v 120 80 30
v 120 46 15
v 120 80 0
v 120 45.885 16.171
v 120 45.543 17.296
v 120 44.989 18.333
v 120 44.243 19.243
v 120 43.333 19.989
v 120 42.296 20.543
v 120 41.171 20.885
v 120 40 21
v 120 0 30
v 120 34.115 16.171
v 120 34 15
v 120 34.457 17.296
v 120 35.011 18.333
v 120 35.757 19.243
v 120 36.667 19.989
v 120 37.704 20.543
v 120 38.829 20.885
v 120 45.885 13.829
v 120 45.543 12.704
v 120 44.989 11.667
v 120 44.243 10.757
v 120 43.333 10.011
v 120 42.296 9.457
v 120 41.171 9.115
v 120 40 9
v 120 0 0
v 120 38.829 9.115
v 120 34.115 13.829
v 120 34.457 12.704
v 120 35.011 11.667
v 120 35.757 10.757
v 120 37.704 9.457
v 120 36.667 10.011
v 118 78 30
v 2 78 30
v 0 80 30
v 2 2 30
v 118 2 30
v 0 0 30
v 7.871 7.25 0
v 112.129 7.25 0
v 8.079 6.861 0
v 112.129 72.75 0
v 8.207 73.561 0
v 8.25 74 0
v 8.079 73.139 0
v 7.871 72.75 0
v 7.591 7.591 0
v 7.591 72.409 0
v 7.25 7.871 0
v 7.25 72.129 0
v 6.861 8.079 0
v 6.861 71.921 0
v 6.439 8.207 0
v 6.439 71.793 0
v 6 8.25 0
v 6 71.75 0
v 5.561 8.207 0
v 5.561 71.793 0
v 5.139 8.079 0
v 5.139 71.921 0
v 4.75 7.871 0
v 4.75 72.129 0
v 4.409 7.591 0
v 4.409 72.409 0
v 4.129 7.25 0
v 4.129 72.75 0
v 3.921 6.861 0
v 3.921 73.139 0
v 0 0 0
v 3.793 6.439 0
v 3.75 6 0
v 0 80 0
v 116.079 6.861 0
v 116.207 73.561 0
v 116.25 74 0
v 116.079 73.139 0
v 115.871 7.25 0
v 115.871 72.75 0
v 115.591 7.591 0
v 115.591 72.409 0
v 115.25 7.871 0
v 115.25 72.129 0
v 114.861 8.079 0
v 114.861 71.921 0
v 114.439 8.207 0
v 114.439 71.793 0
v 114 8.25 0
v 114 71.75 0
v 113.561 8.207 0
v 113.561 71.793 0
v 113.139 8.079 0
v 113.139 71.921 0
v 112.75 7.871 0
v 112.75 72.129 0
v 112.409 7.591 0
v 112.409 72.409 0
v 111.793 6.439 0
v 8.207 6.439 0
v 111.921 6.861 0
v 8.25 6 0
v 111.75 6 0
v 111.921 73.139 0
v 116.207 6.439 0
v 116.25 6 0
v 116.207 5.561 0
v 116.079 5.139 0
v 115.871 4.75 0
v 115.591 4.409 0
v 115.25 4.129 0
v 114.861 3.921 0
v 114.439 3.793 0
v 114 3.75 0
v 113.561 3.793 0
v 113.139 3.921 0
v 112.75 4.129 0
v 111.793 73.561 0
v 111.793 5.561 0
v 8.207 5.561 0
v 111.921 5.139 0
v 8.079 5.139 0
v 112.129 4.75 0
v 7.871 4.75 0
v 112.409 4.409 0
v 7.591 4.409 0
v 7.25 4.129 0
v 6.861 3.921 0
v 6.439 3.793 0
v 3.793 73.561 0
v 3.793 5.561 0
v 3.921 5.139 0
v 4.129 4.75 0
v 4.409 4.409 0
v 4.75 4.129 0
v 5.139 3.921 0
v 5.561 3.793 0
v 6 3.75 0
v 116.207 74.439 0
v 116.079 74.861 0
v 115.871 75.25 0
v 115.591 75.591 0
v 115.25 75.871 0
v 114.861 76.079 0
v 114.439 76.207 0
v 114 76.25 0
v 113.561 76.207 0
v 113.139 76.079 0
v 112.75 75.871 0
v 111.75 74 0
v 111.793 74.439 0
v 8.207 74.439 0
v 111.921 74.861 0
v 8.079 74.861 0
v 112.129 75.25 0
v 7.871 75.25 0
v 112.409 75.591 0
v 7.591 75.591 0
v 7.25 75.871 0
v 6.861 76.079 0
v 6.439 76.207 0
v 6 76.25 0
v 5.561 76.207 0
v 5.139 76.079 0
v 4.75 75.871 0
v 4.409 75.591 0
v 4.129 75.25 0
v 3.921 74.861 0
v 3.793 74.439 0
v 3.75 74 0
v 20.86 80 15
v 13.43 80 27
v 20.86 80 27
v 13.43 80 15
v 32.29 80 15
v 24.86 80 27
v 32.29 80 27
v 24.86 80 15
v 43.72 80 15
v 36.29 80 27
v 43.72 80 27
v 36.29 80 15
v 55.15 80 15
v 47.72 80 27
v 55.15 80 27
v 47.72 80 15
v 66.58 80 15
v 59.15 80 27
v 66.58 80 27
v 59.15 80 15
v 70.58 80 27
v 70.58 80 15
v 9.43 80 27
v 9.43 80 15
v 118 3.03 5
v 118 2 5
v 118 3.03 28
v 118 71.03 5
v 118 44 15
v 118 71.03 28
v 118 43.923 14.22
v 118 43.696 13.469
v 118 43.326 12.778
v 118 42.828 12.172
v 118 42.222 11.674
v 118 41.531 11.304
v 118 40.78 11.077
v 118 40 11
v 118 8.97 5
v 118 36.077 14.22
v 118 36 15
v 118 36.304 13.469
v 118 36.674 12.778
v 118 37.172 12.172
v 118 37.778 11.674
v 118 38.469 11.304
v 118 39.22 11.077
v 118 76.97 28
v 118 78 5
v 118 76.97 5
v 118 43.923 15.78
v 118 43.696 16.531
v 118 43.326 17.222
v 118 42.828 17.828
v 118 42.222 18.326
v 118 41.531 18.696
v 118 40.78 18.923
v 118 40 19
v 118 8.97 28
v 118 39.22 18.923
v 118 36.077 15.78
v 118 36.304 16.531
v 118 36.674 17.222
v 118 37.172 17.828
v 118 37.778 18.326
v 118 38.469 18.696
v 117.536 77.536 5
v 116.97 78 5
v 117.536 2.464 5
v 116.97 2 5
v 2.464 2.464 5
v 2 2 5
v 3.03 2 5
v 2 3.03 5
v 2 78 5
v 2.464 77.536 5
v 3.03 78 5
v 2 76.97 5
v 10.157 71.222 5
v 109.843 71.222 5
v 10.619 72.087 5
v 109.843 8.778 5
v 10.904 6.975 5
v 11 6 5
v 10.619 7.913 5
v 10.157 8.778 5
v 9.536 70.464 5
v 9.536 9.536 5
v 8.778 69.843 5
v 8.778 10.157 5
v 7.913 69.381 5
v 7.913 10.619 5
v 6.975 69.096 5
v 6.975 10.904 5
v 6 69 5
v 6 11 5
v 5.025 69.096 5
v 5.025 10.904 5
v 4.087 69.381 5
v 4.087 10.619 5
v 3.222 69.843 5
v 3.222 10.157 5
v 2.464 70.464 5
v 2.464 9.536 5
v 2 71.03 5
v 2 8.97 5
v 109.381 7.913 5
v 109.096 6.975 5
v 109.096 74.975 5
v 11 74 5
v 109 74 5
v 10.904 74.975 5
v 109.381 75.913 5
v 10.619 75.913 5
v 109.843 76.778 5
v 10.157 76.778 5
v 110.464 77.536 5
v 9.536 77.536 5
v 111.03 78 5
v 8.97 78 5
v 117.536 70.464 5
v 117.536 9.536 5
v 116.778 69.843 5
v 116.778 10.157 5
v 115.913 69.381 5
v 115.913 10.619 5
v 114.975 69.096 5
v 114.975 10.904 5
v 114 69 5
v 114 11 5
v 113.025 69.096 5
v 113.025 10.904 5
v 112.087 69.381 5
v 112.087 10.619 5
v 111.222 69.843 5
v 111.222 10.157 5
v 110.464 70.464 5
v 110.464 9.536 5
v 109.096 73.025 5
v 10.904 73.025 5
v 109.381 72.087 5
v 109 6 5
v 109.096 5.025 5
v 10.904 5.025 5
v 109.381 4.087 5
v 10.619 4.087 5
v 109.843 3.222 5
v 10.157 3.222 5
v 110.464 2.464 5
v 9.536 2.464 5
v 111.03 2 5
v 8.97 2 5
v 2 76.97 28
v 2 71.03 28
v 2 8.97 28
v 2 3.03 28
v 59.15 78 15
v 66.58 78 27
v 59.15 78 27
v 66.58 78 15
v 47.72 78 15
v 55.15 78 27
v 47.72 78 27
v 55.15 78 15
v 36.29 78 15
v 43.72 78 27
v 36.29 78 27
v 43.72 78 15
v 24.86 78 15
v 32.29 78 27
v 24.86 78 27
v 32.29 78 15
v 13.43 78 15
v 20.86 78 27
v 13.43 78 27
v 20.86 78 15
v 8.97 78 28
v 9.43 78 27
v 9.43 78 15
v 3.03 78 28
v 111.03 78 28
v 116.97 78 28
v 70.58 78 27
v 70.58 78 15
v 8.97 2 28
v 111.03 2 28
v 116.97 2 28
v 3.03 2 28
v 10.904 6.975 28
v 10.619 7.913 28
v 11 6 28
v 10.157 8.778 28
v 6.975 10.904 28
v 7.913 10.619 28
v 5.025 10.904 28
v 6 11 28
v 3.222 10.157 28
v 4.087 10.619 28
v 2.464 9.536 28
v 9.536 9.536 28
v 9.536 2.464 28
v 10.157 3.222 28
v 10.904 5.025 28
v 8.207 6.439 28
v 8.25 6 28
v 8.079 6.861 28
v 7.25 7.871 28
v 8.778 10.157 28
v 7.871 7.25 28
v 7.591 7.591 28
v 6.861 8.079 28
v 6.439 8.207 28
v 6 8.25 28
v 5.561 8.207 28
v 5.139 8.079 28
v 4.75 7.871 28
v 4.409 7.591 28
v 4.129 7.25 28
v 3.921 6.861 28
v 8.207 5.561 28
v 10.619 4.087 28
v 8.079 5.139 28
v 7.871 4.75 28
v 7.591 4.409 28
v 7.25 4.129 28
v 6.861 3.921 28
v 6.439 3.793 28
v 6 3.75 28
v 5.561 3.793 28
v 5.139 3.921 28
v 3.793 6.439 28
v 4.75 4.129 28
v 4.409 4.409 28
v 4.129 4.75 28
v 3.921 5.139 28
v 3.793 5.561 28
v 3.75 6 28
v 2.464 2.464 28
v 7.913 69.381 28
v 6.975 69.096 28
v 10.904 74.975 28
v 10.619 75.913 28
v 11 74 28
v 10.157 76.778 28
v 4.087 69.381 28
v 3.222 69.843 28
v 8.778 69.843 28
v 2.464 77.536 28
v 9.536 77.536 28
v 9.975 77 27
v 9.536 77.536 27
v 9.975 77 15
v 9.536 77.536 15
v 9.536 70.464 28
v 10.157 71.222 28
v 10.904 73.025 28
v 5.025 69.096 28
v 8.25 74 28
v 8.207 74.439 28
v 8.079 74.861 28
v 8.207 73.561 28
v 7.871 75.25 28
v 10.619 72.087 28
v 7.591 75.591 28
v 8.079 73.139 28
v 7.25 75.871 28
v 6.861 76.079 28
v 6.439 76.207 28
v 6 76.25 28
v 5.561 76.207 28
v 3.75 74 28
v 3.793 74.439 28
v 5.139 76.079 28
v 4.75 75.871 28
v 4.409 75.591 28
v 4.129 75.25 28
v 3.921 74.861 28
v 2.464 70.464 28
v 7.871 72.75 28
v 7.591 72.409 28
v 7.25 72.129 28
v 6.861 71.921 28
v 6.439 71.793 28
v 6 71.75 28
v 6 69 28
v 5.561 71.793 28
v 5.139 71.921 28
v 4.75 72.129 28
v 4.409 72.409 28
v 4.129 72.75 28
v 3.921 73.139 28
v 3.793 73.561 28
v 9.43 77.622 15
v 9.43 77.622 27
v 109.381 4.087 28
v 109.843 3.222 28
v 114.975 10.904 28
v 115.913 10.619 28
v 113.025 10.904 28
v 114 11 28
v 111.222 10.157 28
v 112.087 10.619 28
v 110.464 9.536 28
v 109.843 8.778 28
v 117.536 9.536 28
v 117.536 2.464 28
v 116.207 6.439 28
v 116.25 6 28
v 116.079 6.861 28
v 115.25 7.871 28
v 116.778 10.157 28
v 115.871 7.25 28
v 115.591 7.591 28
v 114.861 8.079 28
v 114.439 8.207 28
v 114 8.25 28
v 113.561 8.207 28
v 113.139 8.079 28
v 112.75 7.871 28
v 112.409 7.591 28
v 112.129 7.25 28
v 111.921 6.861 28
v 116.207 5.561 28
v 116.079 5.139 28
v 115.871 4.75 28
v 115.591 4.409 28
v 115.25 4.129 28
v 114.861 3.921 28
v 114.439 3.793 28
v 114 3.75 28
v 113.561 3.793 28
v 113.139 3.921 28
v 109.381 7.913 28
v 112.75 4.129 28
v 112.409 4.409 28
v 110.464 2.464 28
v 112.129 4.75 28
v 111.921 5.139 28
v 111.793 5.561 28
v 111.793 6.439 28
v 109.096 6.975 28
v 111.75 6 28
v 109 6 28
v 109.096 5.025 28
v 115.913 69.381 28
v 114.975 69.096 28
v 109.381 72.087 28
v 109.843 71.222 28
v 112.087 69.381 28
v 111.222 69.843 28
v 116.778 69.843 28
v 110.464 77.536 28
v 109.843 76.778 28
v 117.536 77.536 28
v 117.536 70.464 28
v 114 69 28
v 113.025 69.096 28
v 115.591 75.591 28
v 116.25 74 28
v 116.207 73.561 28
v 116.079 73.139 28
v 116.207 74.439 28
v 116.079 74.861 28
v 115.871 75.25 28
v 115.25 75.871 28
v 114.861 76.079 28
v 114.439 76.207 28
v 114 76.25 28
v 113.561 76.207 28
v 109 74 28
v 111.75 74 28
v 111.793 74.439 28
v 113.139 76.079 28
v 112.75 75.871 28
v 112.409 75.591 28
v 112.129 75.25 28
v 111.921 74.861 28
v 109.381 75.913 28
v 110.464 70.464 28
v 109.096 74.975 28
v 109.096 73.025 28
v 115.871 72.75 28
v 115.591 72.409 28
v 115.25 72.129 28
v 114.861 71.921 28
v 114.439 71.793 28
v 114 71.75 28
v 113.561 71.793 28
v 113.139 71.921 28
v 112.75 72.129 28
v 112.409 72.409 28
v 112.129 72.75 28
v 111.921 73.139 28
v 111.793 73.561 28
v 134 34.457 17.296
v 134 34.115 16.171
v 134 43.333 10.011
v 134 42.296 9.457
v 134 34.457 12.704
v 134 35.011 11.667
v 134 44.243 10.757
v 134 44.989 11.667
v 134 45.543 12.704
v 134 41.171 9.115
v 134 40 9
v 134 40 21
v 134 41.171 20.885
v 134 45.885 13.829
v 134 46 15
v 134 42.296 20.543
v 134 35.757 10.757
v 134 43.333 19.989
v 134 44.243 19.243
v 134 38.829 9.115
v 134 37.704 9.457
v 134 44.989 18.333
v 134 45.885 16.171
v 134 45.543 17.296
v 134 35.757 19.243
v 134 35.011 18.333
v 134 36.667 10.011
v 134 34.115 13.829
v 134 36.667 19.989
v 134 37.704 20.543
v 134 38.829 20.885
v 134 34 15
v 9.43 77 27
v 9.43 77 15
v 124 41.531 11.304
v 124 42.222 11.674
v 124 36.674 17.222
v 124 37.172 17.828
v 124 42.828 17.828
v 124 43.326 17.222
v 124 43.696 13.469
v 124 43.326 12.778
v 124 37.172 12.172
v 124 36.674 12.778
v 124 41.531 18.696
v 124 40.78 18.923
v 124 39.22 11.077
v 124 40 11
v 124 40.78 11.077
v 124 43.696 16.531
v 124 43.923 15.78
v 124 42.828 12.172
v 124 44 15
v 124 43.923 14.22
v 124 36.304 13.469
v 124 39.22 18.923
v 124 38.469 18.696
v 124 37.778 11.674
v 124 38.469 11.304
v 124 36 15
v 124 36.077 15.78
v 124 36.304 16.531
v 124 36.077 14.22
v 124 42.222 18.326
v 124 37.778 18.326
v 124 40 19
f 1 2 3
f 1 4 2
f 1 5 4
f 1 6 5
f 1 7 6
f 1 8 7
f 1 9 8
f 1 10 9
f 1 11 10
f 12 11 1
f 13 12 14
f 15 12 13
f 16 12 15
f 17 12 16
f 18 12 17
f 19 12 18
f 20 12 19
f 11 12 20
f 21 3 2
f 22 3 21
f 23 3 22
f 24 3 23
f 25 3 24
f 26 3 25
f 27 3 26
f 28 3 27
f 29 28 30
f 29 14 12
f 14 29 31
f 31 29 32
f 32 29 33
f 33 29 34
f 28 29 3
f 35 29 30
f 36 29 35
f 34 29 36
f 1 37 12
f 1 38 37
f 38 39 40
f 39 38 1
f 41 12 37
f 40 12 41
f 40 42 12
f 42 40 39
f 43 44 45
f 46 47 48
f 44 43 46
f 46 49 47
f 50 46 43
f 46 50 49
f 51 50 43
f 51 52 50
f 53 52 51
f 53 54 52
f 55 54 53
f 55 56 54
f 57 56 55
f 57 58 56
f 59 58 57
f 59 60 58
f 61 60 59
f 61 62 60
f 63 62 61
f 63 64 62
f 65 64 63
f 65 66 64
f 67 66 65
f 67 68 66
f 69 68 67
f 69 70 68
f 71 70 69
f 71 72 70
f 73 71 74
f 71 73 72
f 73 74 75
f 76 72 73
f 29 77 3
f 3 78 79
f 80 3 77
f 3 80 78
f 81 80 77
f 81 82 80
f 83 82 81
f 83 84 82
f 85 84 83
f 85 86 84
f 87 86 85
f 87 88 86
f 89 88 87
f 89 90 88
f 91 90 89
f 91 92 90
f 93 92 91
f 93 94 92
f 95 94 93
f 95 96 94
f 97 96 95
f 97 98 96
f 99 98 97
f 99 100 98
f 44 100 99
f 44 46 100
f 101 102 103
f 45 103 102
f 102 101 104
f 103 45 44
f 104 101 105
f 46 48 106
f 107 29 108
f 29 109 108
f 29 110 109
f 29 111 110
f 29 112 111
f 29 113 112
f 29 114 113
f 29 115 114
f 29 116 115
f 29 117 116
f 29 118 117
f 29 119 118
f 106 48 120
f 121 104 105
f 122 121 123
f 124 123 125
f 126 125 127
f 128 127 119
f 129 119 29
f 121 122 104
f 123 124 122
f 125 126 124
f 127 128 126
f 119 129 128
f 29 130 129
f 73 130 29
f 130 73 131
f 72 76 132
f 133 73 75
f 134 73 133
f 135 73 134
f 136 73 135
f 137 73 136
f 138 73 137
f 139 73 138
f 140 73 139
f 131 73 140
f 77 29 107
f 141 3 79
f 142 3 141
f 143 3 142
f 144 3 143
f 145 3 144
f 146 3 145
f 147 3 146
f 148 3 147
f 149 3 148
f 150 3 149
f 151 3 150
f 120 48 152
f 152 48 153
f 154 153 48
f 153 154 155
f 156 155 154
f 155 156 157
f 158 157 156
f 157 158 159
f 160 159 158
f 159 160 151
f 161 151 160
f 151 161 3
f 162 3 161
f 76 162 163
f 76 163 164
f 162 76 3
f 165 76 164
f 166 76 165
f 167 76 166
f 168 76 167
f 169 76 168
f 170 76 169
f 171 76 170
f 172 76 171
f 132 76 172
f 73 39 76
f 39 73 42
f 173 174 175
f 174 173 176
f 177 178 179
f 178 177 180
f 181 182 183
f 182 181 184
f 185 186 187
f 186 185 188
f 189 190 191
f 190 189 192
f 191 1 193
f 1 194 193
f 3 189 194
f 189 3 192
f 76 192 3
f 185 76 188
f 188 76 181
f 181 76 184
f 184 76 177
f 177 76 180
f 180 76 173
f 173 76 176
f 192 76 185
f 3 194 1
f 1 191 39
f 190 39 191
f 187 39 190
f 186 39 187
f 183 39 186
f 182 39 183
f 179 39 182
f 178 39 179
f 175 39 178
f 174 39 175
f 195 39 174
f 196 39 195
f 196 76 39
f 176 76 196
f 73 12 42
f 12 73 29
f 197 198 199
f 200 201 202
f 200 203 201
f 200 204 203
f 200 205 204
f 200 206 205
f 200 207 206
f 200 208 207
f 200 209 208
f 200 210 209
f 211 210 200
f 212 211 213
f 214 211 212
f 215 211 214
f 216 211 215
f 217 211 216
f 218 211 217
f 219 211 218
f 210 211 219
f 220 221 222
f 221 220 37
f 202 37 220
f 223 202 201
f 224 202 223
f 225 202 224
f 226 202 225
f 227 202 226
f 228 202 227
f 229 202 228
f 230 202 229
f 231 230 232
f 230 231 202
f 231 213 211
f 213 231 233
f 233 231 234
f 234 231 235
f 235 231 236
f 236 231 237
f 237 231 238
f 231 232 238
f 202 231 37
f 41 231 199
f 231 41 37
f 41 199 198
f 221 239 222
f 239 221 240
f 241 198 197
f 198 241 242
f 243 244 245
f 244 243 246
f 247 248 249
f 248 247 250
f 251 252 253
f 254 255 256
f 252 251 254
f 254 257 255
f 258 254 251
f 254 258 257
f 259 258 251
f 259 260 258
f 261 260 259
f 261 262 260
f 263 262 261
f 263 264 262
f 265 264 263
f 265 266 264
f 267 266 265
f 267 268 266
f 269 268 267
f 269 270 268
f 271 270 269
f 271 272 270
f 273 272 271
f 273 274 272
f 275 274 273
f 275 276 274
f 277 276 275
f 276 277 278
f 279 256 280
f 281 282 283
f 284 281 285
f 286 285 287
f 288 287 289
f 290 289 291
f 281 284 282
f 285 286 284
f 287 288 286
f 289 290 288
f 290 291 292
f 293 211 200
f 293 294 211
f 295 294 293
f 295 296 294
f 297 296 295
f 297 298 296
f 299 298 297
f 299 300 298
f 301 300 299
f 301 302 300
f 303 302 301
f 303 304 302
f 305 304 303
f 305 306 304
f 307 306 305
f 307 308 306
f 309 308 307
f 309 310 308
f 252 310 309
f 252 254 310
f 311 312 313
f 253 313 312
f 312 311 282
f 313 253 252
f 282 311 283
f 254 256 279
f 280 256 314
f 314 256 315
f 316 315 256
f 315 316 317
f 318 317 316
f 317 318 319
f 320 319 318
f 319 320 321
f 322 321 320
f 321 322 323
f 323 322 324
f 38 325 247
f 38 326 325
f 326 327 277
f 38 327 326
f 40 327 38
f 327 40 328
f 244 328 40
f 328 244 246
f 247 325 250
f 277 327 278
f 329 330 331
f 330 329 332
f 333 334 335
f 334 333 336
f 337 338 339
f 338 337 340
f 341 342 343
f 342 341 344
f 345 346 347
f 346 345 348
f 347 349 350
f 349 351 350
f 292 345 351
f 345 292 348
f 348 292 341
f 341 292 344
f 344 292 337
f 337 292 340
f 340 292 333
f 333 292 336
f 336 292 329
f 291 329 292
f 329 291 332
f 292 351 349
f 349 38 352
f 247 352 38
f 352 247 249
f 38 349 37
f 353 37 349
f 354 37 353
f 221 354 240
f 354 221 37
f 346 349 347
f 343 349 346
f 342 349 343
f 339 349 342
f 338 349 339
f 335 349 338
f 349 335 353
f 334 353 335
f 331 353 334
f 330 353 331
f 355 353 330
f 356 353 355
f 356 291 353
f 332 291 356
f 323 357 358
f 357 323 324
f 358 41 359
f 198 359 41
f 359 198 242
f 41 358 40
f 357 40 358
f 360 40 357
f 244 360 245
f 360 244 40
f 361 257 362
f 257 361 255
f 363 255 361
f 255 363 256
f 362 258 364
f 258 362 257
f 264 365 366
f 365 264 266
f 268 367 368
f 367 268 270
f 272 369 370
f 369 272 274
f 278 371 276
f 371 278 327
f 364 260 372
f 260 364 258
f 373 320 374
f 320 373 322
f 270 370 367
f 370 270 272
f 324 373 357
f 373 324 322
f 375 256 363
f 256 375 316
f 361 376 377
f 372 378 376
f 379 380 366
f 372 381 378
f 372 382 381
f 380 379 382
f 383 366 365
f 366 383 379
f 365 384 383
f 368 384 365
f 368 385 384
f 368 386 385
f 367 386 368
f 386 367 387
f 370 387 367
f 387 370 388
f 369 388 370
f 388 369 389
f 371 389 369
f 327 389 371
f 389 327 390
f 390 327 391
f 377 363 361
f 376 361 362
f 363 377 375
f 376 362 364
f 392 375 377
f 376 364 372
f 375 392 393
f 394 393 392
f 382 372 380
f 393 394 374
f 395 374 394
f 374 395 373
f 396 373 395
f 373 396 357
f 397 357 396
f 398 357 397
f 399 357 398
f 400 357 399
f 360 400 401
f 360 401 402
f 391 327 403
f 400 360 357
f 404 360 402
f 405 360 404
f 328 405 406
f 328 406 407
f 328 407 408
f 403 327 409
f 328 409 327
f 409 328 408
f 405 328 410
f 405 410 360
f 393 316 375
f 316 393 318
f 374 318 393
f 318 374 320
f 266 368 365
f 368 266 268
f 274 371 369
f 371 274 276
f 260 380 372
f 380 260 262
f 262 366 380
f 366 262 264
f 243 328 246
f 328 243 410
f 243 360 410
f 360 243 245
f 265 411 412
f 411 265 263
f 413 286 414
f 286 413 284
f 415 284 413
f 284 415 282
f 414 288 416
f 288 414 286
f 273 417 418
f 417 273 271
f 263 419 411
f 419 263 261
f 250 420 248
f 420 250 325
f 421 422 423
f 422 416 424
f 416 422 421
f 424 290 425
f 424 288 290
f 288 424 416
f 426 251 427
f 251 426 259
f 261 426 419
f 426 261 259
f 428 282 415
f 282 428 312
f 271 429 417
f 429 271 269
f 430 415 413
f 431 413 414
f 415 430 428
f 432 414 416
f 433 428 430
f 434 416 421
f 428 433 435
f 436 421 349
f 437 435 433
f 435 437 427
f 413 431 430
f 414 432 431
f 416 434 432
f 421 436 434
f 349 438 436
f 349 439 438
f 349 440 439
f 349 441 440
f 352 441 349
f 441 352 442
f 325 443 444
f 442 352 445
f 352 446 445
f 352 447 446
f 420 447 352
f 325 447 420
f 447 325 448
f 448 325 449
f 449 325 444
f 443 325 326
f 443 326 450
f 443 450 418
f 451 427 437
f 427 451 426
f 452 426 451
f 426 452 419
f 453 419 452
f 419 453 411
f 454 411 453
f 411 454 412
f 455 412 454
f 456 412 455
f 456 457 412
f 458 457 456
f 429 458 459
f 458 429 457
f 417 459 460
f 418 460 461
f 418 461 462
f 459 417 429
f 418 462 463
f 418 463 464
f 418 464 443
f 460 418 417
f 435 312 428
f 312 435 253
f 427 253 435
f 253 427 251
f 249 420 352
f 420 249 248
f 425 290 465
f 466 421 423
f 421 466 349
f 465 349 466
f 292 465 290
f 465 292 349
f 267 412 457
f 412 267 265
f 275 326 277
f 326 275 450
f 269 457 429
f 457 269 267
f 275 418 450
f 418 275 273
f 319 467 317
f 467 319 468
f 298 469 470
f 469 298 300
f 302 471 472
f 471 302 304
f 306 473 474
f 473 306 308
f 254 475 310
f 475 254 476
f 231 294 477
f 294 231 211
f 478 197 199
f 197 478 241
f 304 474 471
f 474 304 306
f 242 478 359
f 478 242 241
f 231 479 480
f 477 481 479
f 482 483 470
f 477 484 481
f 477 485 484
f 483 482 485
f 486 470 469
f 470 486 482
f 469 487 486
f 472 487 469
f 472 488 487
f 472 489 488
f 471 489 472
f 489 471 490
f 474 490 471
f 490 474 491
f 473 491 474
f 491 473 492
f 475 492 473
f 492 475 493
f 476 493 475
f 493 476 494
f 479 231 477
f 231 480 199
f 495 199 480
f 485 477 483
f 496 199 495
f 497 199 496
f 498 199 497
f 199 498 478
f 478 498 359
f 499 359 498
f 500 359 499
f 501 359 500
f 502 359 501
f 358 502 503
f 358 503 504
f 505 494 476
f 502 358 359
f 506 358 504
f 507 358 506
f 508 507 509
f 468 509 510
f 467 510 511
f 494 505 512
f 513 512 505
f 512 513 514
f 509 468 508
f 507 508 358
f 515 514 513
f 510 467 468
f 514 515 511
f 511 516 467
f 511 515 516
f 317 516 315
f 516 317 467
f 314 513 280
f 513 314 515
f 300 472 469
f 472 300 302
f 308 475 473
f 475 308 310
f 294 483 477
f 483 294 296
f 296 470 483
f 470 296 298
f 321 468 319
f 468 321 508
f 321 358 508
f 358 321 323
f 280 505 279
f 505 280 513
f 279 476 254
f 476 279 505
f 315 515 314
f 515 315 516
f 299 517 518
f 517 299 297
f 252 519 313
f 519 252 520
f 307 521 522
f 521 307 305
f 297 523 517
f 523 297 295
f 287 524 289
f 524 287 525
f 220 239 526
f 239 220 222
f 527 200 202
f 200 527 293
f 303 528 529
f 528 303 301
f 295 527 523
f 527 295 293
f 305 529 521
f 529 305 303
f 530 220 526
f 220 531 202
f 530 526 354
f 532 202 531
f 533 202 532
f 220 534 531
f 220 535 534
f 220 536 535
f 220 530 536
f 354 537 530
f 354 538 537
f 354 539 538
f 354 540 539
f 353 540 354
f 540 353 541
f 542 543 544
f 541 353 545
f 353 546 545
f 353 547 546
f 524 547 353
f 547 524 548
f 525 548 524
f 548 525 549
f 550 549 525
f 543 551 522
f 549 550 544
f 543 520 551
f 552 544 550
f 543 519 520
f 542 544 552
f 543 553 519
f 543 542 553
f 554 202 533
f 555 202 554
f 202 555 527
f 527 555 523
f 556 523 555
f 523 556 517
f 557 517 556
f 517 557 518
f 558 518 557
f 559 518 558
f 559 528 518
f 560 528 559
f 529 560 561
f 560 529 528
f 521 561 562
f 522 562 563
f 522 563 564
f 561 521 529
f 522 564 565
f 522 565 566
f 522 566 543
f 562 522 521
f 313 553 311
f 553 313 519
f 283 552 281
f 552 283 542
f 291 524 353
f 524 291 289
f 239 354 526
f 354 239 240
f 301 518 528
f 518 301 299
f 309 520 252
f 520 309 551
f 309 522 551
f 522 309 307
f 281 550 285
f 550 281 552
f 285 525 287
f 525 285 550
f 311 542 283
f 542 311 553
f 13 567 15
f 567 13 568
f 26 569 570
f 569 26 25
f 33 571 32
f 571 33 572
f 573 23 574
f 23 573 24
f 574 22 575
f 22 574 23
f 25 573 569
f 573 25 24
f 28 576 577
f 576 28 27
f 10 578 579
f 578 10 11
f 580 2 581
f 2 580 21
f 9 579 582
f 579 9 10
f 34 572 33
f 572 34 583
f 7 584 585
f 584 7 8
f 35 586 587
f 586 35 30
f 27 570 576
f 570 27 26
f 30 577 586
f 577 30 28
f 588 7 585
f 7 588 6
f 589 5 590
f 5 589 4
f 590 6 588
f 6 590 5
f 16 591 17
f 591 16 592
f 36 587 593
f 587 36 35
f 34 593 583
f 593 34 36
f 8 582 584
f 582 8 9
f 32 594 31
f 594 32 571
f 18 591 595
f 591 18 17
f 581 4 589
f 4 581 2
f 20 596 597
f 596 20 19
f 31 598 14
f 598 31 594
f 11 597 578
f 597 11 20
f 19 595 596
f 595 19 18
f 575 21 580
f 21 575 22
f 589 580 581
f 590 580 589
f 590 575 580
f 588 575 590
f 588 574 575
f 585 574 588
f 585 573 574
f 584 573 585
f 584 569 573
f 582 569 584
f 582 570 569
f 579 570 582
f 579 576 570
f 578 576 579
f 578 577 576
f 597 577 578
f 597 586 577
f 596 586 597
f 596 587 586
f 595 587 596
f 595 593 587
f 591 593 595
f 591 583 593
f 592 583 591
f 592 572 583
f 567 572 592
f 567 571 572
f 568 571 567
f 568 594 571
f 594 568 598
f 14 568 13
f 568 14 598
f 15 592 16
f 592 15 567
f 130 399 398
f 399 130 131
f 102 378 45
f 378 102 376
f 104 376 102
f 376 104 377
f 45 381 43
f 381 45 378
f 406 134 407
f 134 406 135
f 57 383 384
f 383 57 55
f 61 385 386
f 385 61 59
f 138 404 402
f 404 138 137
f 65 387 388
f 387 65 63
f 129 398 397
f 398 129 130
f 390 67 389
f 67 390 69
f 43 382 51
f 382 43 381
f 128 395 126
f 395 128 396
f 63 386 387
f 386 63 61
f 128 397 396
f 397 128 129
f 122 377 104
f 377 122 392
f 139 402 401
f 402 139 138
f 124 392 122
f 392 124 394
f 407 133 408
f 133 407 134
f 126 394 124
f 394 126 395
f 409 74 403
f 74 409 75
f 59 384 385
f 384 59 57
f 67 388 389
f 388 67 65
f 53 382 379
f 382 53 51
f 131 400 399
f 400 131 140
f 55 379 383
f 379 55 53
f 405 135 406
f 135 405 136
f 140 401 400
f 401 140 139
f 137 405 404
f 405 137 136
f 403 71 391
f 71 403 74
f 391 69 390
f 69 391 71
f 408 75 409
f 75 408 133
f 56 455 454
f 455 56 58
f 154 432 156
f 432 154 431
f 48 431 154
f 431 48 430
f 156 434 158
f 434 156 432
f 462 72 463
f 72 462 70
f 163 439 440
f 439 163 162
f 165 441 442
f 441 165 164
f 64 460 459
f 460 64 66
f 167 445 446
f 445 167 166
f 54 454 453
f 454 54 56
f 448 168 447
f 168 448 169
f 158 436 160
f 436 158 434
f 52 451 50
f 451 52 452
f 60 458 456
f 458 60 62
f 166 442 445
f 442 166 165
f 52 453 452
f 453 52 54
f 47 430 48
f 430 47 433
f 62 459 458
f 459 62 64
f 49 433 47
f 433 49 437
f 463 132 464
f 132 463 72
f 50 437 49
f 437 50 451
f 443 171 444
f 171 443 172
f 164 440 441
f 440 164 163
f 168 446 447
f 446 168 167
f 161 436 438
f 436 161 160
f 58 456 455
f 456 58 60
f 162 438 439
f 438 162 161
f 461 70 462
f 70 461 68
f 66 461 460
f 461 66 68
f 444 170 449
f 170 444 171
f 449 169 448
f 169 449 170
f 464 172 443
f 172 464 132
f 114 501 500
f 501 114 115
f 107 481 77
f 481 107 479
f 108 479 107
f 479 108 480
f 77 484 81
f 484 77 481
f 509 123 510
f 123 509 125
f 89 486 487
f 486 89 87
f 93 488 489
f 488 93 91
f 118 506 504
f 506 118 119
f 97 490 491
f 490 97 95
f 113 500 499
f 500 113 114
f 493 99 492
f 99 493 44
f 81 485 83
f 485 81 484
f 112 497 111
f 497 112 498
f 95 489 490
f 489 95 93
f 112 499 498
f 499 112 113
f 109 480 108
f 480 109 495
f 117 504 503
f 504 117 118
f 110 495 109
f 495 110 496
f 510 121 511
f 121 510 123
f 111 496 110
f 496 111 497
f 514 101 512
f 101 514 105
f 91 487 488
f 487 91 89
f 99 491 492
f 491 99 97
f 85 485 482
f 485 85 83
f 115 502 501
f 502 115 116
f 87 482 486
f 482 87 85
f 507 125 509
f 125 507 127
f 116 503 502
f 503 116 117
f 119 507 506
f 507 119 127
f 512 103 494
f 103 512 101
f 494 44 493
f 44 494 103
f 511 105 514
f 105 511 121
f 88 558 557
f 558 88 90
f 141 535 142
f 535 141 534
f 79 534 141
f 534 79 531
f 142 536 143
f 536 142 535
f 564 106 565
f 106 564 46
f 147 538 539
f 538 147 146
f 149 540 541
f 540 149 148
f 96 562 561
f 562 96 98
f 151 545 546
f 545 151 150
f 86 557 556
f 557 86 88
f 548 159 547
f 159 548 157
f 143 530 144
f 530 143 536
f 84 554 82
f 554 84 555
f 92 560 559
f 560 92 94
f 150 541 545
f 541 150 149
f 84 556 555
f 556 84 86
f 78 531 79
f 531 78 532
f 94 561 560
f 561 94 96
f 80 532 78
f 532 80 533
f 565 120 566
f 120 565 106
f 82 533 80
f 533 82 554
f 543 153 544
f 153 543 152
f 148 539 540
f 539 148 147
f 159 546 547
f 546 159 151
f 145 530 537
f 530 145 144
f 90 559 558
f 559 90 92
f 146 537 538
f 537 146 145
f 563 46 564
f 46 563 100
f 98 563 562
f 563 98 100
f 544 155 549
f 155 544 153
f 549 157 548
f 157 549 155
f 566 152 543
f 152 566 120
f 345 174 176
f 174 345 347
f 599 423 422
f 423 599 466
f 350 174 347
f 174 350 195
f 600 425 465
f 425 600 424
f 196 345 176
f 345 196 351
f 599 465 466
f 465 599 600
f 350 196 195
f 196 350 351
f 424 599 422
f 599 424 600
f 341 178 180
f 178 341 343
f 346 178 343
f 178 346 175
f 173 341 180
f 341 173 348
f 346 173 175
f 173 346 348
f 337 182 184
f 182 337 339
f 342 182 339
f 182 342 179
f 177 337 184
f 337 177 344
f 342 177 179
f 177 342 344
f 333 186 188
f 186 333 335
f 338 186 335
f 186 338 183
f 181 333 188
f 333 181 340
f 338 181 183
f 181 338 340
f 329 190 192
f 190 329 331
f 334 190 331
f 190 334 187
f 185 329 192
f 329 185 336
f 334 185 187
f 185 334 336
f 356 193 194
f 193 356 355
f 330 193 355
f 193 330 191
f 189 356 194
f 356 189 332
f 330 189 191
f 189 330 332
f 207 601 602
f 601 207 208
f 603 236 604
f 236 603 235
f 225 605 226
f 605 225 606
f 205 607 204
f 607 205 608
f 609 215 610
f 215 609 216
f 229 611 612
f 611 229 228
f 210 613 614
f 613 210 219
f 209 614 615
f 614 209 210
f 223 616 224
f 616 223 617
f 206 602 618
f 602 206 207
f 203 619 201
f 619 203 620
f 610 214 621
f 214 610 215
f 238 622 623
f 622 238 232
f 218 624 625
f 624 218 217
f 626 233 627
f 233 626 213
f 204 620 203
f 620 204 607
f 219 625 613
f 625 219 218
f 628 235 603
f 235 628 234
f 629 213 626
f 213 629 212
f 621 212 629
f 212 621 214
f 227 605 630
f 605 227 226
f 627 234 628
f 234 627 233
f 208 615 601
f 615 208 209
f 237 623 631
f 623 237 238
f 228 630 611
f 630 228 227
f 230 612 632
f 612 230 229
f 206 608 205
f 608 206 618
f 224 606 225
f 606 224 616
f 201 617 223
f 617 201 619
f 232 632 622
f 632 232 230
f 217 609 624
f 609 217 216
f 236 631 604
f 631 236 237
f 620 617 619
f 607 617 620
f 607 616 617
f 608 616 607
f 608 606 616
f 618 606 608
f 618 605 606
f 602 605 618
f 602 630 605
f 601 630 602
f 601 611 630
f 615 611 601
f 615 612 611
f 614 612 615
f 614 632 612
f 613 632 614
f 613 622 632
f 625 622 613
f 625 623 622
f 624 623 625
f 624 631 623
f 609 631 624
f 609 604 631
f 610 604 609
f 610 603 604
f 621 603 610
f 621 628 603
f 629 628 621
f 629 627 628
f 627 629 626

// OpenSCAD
$fn = 32;

// ----------------------------------------------------------------------
// Enclosure body: 120 x 80 x 30 mm, wall 2 mm
// ----------------------------------------------------------------------

// --- parameters (mm) ---
length = 120;             // outside length, X
width = 80;               // outside width, Y
height = 30;              // outside height, Z
wall = 2;                 // side wall thickness
floor_t = 5;              // floor thickness
boss_d = 10;              // corner boss diameter
boss_h = 23;              // corner boss height above the floor
boss_hole_d = 4.5;        // lid screw clearance in the boss
boss_lip = 6;             // boss centre inset from the corner
vent_slots = 6;           // vent slots in the long wall
vent_w = 4;               // vent slot width
vent_h = 12;              // vent slot height
vent_pitch = 11.43;       // vent slot pitch
vent_z = 15;              // vent slot sill height
nipple_d = 12;            // cable gland boss diameter
nipple_h = 14;            // cable gland boss height
nipple_bore = 8;          // cable gland bore

module shell() {
  difference() {
    cube([length, width, height]);
    /* hollow, open at the top */
    translate([wall, wall, floor_t])
      cube([length - 2 * wall, width - 2 * wall, height]);
  }
}

module bosses() {
  /* corner bosses, sunk 1 mm into the floor */
  for (sx = [0, 1]) for (sy = [0, 1])
    translate([sx * (length - 2 * boss_lip) + boss_lip, sy * (width - 2 * boss_lip) + boss_lip, floor_t - 1])
      cylinder(h = boss_h + 1, d = boss_d);
}

module gland() {
  /* boss on the short wall, sunk 1 mm into it */
  translate([length - 1, width / 2, height * 0.5]) rotate([0, 90, 0])
    cylinder(h = nipple_h + 1, d = nipple_d);
}

difference() {
  union() {
    shell();
    bosses();
    gland();
  }
  /* boss screw holes */
  for (sx = [0, 1]) for (sy = [0, 1])
    translate([sx * (length - 2 * boss_lip) + boss_lip, sy * (width - 2 * boss_lip) + boss_lip, -1]) cylinder(h = floor_t + boss_h + 2, d = boss_hole_d);
  /* vent grille in the +Y wall */
  for (i = [0 : vent_slots - 1]) translate([vent_pitch * (i + 1) - vent_w / 2, width - wall - 1, vent_z]) cube([vent_w, wall + 2, vent_h]);
  translate([length, width / 2, height * 0.5]) rotate([0, 90, 0]) translate([0, 0, -nipple_h - 2]) cylinder(h = nipple_h + wall + 4, d = nipple_bore);
}
